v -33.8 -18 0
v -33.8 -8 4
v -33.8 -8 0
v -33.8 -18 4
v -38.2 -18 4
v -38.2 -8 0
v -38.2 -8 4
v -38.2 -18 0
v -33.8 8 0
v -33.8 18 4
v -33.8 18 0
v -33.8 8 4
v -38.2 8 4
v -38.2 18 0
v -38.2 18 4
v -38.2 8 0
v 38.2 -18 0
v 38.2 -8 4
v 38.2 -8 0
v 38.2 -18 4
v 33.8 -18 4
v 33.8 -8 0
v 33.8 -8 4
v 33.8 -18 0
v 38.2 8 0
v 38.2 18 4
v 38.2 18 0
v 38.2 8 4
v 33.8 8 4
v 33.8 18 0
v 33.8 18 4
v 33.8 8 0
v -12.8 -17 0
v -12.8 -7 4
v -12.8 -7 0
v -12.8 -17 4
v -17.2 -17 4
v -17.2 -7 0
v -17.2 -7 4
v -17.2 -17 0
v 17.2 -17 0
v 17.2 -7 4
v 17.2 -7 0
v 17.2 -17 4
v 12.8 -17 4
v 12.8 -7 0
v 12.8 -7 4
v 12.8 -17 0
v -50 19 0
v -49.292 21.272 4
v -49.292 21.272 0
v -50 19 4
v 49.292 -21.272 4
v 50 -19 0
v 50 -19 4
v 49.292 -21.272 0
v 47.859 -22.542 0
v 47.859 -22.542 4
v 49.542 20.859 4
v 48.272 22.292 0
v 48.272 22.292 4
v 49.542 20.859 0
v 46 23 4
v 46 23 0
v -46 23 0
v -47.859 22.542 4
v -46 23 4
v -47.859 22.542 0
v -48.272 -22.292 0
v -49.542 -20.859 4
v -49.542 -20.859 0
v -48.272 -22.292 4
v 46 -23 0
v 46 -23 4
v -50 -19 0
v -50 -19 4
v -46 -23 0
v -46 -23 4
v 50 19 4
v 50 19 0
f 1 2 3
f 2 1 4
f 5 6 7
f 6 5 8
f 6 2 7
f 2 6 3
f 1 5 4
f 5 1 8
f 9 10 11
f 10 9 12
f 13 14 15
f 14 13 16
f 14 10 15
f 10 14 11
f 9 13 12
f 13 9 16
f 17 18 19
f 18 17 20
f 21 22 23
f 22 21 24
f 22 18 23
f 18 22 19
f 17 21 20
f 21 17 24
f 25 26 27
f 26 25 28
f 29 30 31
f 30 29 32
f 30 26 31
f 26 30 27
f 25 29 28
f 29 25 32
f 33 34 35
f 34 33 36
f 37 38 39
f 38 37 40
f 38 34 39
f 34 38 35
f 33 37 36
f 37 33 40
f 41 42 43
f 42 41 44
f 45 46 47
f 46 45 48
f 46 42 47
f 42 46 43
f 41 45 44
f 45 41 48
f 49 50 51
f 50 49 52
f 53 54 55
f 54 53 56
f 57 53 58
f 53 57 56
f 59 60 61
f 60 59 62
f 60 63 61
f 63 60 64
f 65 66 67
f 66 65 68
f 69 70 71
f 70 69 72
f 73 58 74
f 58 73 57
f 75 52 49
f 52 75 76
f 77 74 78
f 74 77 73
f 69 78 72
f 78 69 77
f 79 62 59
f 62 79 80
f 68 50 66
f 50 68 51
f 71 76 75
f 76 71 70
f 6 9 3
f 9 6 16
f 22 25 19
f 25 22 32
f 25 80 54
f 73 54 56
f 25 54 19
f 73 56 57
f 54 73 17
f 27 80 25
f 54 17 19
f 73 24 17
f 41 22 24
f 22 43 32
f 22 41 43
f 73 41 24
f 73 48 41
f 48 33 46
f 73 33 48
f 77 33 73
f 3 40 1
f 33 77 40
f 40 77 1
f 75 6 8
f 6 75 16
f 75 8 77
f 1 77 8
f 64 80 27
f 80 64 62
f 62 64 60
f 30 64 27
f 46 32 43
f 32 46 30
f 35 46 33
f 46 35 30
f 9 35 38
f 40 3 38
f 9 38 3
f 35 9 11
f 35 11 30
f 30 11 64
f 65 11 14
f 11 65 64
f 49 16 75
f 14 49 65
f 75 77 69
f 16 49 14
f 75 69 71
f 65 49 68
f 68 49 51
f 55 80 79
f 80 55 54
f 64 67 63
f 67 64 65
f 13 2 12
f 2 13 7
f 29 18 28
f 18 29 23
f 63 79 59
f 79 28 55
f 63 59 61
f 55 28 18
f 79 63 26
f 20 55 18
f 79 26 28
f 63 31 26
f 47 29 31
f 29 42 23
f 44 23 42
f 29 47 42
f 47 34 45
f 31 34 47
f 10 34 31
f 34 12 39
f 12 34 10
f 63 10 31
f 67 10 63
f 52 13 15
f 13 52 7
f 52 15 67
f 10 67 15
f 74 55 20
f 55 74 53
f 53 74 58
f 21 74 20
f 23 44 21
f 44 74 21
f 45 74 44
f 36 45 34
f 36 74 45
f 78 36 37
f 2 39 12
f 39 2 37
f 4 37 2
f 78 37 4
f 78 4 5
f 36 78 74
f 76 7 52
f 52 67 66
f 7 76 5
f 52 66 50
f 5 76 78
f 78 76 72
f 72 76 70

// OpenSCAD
// SPDX-License-Identifier: CC-BY-4.0
// Proposal v0.1: non-structural dry-side cable label/retainer plate.
// Never mount at the water edge without separate material and retrieval review.
// Print flat; verify fit, material aging and tie retention before use.

plate_width = 100;      // mm: across the rail
plate_height = 46;      // mm: along the rail
plate_thickness = 4;    // mm
edge_radius = 4;        // mm
slot_width = 4.4;       // mm: allow selected cable tie + print tolerance
slot_length = 10;       // mm
rail_tie_spacing = 26;  // mm, centre-to-centre
cable_tie_x = 15;       // mm, each cable slot offset from centre
rail_tie_x = 36;        // mm, rail tie column offset from centre
label_width = 24;       // mm, flat upper central label area
label_height = 12;      // mm

assert(plate_width >= 2*(rail_tie_x + slot_width/2 + edge_radius));
assert(rail_tie_spacing + slot_length + 2*edge_radius <= plate_height);
assert(label_width < 2*cable_tie_x - slot_width);
assert(label_height + slot_length + 8 <= plate_height);

module rounded_plate(w, h, r, t) {
    linear_extrude(height=t)
        offset(r=r) square([w-2*r, h-2*r], center=true);
}

module through_slot(x, y) {
    translate([x, y, -0.2])
        cube([slot_width, slot_length, plate_thickness+0.4], center=false);
}

difference() {
    rounded_plate(plate_width, plate_height, edge_radius, plate_thickness);
    // Outer slots tie this plate to a cabinet rail; cables carry no load.
    for (x = [-rail_tie_x-slot_width/2, rail_tie_x-slot_width/2])
        for (y = [-rail_tie_spacing/2-slot_length/2,
                   rail_tie_spacing/2-slot_length/2])
            through_slot(x, y);
    // Inner slots hold a cable in the lower part of the plate; the upper
    // centre remains flat for a small printed adhesive ID/QR label.
    for (x = [-cable_tie_x-slot_width/2,
               cable_tie_x-slot_width/2])
        through_slot(x, -17);
}
